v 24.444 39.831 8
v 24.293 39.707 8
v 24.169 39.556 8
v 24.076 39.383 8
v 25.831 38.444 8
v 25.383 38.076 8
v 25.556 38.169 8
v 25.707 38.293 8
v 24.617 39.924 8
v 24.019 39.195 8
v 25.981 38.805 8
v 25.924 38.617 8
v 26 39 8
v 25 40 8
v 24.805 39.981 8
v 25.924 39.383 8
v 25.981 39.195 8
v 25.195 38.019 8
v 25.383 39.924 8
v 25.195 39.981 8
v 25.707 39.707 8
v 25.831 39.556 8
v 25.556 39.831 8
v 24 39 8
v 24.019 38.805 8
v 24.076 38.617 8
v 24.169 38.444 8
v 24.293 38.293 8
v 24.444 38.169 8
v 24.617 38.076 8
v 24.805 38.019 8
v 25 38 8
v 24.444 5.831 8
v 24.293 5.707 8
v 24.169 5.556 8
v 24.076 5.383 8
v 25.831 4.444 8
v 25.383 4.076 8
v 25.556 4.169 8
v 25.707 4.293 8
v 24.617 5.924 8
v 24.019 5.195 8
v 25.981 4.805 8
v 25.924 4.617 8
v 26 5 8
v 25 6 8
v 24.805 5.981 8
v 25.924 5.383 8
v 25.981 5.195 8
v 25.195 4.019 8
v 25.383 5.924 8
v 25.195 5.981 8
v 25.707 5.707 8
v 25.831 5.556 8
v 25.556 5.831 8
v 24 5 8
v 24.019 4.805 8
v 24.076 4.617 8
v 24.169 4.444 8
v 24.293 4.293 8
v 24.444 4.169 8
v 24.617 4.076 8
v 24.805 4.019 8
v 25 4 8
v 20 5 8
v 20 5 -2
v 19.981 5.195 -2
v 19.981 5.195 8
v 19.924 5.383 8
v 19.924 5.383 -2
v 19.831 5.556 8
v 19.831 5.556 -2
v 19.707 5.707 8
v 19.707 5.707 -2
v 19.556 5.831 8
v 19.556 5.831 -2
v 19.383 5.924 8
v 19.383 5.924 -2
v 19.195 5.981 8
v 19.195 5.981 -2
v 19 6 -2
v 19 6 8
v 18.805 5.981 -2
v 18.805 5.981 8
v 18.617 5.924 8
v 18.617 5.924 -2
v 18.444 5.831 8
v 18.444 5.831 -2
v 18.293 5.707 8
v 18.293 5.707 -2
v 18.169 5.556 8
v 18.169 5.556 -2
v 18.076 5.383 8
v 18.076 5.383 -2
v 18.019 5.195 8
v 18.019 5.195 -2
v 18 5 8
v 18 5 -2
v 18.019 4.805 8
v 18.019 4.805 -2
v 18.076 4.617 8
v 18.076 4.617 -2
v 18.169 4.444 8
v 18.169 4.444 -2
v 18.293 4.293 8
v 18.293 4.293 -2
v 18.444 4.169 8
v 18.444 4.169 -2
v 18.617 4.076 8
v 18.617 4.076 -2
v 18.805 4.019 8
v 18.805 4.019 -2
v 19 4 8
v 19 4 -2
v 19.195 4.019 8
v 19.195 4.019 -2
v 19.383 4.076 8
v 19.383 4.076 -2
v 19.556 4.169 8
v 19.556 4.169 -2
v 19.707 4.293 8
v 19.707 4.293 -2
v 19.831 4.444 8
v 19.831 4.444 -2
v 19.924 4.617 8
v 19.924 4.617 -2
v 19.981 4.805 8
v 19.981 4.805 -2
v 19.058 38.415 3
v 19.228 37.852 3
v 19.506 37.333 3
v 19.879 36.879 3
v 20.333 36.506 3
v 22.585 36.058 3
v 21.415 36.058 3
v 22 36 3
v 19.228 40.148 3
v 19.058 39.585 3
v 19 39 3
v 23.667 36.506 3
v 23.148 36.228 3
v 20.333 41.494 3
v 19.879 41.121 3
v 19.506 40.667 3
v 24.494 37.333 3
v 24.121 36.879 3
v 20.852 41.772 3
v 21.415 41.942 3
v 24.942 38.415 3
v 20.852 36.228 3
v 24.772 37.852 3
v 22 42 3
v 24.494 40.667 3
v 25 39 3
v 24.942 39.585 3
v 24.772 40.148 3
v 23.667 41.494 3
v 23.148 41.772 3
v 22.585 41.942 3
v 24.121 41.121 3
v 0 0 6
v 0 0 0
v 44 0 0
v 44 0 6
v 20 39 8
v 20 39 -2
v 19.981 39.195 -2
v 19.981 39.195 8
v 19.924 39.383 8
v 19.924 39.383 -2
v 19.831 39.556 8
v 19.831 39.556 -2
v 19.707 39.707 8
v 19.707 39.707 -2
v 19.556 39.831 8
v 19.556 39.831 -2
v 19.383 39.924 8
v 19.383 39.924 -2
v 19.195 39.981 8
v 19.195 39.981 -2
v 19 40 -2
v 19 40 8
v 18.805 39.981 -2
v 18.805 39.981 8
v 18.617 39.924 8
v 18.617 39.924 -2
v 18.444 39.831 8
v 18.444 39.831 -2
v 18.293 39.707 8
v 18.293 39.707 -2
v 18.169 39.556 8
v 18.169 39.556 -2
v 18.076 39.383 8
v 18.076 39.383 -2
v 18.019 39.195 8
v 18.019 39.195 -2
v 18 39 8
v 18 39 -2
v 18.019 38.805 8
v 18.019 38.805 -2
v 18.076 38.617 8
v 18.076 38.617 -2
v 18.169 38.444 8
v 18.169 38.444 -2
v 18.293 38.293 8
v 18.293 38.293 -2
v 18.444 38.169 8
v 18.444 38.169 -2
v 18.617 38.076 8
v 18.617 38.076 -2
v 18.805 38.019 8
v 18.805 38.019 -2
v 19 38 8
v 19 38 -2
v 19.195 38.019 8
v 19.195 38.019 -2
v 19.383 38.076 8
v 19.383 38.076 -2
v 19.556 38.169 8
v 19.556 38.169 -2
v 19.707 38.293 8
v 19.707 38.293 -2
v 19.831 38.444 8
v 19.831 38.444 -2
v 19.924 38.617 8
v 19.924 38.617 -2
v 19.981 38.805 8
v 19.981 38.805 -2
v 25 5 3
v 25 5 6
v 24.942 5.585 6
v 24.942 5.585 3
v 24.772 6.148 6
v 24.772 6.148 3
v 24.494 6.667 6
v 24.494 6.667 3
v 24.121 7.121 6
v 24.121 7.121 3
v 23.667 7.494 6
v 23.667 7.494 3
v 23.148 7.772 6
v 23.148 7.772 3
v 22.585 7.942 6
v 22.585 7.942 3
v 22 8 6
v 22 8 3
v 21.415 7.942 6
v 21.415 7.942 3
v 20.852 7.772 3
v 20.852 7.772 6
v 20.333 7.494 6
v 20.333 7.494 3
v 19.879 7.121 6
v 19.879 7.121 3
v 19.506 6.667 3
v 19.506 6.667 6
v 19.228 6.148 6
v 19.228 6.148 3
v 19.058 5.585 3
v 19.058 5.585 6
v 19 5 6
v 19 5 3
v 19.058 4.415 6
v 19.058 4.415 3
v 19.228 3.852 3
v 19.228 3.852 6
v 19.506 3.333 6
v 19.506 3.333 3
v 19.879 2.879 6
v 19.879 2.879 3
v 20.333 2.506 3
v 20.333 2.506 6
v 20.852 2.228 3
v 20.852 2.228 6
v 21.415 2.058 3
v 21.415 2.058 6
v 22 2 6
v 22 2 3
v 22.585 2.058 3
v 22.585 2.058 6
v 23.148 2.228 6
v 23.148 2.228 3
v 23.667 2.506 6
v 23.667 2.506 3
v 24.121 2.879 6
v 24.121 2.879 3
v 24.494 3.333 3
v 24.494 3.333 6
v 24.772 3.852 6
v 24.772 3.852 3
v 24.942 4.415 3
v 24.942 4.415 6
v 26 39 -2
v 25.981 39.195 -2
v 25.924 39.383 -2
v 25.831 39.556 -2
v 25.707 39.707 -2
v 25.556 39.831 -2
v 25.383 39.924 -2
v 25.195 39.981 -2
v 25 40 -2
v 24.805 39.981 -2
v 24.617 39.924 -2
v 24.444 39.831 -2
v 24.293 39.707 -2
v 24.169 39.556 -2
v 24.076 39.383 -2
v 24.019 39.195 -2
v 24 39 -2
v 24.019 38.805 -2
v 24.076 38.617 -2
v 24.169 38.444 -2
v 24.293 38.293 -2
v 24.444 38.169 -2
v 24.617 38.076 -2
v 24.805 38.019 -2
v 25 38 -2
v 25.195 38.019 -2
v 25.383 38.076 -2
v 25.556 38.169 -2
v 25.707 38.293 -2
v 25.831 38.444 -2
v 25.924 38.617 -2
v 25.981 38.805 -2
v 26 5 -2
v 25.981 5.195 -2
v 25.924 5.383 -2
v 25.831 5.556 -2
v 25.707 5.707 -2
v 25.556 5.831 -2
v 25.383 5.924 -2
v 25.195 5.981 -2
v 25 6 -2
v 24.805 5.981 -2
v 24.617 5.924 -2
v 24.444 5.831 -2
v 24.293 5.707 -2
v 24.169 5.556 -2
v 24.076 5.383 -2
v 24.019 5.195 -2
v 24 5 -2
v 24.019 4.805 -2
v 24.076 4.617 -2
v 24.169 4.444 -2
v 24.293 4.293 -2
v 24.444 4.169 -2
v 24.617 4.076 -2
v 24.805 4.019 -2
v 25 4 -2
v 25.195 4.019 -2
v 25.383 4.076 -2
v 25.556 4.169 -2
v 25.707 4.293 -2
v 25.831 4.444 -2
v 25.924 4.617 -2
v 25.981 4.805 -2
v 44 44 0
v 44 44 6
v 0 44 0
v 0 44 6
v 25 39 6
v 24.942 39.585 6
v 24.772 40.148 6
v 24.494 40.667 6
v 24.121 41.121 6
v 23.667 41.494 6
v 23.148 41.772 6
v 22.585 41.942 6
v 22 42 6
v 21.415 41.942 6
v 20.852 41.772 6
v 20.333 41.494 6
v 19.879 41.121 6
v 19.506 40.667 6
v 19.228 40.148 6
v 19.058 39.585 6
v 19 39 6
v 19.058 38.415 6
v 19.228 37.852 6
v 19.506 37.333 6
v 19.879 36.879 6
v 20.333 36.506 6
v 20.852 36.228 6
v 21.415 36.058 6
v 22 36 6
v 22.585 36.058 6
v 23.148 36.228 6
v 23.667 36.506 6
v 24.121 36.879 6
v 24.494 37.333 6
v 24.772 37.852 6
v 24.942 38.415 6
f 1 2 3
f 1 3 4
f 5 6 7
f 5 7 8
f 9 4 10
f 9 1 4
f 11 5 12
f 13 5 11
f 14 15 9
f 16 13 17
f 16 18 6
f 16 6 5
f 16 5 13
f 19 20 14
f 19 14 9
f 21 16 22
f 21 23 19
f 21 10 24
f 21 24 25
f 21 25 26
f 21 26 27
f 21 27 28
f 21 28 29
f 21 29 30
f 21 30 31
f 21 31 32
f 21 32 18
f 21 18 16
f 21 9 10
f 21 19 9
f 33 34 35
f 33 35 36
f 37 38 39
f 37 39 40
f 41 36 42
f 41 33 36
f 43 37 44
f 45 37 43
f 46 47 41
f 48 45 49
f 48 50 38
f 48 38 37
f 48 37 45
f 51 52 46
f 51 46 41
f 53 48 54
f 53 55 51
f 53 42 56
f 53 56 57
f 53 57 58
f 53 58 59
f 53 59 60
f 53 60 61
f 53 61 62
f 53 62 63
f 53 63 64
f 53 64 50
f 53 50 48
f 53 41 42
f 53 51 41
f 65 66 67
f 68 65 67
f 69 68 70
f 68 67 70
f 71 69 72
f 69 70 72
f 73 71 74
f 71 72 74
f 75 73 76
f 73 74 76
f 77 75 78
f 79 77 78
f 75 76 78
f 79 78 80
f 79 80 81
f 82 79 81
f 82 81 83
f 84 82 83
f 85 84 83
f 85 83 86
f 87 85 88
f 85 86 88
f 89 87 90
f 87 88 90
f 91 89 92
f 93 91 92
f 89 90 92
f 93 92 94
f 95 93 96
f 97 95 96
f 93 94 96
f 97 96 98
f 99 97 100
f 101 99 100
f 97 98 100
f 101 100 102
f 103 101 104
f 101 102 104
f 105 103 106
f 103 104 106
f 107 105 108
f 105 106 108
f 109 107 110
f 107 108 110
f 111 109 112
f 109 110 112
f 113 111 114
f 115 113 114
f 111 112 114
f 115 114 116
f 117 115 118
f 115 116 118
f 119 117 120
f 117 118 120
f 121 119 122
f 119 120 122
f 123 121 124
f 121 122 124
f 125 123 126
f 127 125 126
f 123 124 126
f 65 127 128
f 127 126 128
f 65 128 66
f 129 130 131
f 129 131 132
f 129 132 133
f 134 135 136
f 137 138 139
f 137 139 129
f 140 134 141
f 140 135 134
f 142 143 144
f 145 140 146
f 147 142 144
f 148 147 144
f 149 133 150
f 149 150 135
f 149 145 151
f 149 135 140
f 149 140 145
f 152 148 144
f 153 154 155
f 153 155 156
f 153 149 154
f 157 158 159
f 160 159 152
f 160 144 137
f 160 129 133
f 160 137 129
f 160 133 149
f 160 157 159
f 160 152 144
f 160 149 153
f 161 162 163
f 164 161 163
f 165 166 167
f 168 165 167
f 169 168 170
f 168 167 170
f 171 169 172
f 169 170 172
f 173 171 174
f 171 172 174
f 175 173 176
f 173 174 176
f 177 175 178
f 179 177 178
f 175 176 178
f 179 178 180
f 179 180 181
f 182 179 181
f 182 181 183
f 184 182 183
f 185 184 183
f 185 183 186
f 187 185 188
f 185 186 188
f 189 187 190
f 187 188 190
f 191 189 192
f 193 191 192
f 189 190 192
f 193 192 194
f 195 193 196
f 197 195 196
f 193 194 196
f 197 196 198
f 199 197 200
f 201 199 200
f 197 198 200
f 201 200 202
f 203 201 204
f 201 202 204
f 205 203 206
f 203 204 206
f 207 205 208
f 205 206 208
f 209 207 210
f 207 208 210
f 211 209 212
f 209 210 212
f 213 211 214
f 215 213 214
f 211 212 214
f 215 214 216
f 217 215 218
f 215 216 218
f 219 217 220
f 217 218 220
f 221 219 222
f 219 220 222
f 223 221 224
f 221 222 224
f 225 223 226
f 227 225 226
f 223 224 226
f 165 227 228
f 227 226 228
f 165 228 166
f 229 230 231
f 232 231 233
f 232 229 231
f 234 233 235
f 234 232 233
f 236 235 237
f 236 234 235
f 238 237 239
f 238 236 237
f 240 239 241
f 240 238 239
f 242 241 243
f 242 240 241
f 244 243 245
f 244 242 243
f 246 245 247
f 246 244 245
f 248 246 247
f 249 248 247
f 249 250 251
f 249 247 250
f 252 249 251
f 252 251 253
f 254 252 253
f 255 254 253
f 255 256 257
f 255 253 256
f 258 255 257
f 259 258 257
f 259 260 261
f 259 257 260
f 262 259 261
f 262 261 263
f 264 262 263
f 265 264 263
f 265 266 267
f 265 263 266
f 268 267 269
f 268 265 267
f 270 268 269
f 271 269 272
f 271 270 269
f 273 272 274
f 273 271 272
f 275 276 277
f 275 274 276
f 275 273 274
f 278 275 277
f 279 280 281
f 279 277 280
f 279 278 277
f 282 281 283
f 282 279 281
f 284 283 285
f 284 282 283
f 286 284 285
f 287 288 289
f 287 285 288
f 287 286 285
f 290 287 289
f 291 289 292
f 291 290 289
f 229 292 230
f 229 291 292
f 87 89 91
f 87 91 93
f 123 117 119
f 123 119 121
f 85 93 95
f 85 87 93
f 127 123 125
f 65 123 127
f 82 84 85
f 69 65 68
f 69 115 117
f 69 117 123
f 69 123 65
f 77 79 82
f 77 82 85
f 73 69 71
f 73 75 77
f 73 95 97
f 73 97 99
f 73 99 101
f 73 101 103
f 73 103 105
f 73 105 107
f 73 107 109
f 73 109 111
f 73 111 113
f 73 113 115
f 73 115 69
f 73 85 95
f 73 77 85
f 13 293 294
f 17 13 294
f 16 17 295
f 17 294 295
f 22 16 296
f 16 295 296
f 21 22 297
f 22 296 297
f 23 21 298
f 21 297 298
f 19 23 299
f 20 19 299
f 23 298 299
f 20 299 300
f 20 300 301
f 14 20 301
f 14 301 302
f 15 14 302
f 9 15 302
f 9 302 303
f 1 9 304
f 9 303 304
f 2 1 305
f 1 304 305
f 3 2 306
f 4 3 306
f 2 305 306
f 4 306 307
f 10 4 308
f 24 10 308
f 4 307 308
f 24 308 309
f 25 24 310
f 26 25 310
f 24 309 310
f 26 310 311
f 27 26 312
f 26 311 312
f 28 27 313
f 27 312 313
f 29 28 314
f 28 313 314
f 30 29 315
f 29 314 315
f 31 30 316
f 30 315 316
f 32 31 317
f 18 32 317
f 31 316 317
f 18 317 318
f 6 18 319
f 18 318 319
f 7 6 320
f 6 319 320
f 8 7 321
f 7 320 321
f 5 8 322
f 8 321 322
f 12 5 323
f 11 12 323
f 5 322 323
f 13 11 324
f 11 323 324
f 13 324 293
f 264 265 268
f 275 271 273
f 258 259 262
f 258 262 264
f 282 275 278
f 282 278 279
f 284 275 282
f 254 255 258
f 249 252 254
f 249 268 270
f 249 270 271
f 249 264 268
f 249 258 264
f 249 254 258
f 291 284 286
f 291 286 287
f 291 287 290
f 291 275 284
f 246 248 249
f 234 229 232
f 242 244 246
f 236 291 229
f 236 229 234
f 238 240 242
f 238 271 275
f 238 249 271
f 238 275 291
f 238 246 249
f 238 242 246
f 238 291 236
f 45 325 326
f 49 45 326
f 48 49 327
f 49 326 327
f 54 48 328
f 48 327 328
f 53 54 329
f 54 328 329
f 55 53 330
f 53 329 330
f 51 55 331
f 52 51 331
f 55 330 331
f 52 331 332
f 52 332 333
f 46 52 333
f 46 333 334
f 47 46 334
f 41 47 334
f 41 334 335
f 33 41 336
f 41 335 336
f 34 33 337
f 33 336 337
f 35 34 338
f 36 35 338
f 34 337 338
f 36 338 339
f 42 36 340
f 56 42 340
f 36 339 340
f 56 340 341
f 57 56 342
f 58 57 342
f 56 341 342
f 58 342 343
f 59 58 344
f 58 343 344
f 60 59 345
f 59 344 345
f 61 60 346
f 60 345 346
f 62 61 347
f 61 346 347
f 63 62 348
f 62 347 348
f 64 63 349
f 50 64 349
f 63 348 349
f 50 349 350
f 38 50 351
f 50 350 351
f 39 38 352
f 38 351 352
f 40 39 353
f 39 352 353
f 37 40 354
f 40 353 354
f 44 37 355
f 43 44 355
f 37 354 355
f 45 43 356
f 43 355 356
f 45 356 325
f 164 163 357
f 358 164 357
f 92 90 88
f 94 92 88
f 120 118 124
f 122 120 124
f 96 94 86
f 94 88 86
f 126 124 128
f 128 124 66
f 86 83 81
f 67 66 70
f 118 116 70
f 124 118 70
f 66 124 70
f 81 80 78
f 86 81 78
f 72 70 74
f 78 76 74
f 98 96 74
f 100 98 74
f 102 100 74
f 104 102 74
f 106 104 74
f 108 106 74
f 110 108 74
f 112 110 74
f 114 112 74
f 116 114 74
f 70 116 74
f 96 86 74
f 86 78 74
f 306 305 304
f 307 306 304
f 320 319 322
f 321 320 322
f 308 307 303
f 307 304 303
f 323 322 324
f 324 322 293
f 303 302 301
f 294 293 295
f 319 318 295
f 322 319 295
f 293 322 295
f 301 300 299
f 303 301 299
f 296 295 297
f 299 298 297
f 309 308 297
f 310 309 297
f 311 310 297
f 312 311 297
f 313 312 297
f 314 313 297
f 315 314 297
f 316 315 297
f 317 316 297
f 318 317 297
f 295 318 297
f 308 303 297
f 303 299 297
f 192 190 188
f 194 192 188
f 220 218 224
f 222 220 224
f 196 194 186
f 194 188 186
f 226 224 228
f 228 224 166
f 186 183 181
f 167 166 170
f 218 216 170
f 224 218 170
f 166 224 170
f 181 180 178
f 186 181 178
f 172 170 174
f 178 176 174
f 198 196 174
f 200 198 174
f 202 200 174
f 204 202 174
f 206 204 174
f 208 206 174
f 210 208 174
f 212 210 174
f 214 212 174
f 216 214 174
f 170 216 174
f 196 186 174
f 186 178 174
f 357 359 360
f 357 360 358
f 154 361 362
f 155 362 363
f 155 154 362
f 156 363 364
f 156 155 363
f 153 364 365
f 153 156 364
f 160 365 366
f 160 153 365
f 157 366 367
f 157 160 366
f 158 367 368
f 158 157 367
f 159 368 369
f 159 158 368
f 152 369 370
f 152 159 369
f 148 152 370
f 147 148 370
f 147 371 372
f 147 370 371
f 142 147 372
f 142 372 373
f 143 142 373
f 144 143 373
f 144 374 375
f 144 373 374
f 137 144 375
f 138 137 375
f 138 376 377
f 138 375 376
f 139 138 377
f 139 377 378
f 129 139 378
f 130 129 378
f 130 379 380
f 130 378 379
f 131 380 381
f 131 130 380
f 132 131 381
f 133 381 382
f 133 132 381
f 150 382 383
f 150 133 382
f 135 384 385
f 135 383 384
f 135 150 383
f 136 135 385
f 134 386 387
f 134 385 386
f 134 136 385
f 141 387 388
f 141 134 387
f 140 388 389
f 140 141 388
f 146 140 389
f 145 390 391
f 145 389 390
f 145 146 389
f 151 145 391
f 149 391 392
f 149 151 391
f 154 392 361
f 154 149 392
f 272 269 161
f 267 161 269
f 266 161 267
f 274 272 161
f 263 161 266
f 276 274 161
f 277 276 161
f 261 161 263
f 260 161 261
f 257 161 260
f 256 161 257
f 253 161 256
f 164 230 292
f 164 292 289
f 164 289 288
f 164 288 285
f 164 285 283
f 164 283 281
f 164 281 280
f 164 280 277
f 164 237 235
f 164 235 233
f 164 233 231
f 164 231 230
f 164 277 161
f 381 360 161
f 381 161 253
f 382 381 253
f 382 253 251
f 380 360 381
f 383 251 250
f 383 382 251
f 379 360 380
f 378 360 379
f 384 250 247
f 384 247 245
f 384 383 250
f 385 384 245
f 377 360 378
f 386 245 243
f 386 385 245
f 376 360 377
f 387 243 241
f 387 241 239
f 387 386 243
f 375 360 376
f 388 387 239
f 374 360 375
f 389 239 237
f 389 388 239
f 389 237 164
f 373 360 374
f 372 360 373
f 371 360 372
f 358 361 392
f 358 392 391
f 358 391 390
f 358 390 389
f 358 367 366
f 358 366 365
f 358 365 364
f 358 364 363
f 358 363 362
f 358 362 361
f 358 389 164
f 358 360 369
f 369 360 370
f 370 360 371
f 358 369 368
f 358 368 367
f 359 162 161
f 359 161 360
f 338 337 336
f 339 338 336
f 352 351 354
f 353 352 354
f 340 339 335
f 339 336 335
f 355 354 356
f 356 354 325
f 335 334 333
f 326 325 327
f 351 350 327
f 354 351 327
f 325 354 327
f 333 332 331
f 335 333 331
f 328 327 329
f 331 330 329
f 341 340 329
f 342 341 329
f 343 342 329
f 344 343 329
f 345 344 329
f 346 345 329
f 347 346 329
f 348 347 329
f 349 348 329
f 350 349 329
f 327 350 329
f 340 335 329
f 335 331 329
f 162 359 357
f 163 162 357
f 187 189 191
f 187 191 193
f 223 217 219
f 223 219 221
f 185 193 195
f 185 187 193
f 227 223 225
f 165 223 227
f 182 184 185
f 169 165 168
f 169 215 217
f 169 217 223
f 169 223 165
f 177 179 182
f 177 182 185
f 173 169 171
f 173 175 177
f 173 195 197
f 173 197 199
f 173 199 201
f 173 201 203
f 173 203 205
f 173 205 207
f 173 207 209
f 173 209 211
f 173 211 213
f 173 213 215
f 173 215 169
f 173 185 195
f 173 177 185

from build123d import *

# Parameters (mm, degrees)
CYLINDER_R        = 3
CYLINDER_DEPTH    = 10
CYLINDER001_R     = 3
CYLINDER001_DEPTH = 10
BOX_W             = 44
BOX_H             = 44
BOX_DEPTH         = 6
CYLINDER002_R     = 1
CYLINDER002_DEPTH = 10
CYLINDER003_R     = 1
CYLINDER003_DEPTH = 10
CYLINDER004_R     = 1
CYLINDER004_DEPTH = 10
CYLINDER005_R     = 1
CYLINDER005_DEPTH = 10


with BuildPart() as cylinder:
    # Cylinder → Cylinder (new body)
    with BuildSketch(Plane(origin=(22, 5, 3), x_dir=(1, 0, 0), z_dir=(0, 0, 1))):
        Circle(CYLINDER_R)
    extrude(amount=CYLINDER_DEPTH)


with BuildPart() as cylinder001:
    # Cylinder001 → Cylinder001 (new body)
    with BuildSketch(Plane(origin=(22, 39, 3), x_dir=(1, 0, 0), z_dir=(0, 0, 1))):
        Circle(CYLINDER001_R)
    extrude(amount=CYLINDER001_DEPTH)


with BuildPart() as cut001:
    # Box → Box (new body)
    with BuildSketch(Plane.XY):
        with Locations((22, 22)):
            Rectangle(BOX_W, BOX_H)
    extrude(amount=BOX_DEPTH)

    # Cut: cut Cylinder001
    add(cylinder001.part, mode=Mode.SUBTRACT)

    # Cut001: cut Cylinder
    add(cylinder.part, mode=Mode.SUBTRACT)


with BuildPart() as cylinder002:
    # Cylinder002 → Cylinder002 (new body)
    with BuildSketch(Plane(origin=(19, 5, -2), x_dir=(1, 0, 0), z_dir=(0, 0, 1))):
        Circle(CYLINDER002_R)
    extrude(amount=CYLINDER002_DEPTH)


with BuildPart() as cylinder003:
    # Cylinder003 → Cylinder003 (new body)
    with BuildSketch(Plane(origin=(25, 5, -2), x_dir=(1, 0, 0), z_dir=(0, 0, 1))):
        Circle(CYLINDER003_R)
    extrude(amount=CYLINDER003_DEPTH)


with BuildPart() as cylinder004:
    # Cylinder004 → Cylinder004 (new body)
    with BuildSketch(Plane(origin=(19, 39, -2), x_dir=(1, 0, 0), z_dir=(0, 0, 1))):
        Circle(CYLINDER004_R)
    extrude(amount=CYLINDER004_DEPTH)


with BuildPart() as cylinder005:
    # Cylinder005 → Cylinder005 (new body)
    with BuildSketch(Plane(origin=(25, 39, -2), x_dir=(1, 0, 0), z_dir=(0, 0, 1))):
        Circle(CYLINDER005_R)
    extrude(amount=CYLINDER005_DEPTH)


solid = Compound([cut001.part, cylinder002.part, cylinder003.part, cylinder004.part, cylinder005.part])
